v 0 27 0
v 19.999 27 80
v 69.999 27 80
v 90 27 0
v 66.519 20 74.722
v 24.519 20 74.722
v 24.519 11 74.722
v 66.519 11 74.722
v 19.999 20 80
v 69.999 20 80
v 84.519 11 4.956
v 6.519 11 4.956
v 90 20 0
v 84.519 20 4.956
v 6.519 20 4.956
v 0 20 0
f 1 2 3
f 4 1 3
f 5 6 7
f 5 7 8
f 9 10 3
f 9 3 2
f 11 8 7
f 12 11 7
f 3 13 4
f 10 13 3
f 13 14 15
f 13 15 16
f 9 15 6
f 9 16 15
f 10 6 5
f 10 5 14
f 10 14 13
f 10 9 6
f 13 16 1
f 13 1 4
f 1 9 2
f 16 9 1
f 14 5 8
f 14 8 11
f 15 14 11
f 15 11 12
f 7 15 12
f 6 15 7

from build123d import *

# Parameters (mm, degrees)
EXTRUDE006_DEPTH = 7
EXTRUDE002_DEPTH = 15


with BuildPart() as extrude006:
    # Sketch007 → Extrude006 (new body)
    with BuildSketch(Plane(origin=(0, 20, 0), x_dir=(-1, 0, 0), z_dir=(0, 1, 0))):
        Polygon((-90, 0), (-69.999121, 80.000221), (-19.999121, 80.000221), (0, 0), align=None)
    extrude(amount=EXTRUDE006_DEPTH)


with BuildPart() as fusion:
    # Sketch003 → Extrude002 (new body)
    with BuildSketch(Plane.XZ):
        Polygon((6.519191, 4.955519), (24.519191, 74.72189), (66.519191, 74.72189), (84.519191, 4.955519), align=None)
    extrude(amount=EXTRUDE002_DEPTH)


with BuildPart() as fusion_1:
    # Extrude002 placement: moved
    add(fusion.part.moved(Location((0, 26, 0))))

    # Fusion: union Extrude006
    add(extrude006.part)


solid = fusion_1.part
